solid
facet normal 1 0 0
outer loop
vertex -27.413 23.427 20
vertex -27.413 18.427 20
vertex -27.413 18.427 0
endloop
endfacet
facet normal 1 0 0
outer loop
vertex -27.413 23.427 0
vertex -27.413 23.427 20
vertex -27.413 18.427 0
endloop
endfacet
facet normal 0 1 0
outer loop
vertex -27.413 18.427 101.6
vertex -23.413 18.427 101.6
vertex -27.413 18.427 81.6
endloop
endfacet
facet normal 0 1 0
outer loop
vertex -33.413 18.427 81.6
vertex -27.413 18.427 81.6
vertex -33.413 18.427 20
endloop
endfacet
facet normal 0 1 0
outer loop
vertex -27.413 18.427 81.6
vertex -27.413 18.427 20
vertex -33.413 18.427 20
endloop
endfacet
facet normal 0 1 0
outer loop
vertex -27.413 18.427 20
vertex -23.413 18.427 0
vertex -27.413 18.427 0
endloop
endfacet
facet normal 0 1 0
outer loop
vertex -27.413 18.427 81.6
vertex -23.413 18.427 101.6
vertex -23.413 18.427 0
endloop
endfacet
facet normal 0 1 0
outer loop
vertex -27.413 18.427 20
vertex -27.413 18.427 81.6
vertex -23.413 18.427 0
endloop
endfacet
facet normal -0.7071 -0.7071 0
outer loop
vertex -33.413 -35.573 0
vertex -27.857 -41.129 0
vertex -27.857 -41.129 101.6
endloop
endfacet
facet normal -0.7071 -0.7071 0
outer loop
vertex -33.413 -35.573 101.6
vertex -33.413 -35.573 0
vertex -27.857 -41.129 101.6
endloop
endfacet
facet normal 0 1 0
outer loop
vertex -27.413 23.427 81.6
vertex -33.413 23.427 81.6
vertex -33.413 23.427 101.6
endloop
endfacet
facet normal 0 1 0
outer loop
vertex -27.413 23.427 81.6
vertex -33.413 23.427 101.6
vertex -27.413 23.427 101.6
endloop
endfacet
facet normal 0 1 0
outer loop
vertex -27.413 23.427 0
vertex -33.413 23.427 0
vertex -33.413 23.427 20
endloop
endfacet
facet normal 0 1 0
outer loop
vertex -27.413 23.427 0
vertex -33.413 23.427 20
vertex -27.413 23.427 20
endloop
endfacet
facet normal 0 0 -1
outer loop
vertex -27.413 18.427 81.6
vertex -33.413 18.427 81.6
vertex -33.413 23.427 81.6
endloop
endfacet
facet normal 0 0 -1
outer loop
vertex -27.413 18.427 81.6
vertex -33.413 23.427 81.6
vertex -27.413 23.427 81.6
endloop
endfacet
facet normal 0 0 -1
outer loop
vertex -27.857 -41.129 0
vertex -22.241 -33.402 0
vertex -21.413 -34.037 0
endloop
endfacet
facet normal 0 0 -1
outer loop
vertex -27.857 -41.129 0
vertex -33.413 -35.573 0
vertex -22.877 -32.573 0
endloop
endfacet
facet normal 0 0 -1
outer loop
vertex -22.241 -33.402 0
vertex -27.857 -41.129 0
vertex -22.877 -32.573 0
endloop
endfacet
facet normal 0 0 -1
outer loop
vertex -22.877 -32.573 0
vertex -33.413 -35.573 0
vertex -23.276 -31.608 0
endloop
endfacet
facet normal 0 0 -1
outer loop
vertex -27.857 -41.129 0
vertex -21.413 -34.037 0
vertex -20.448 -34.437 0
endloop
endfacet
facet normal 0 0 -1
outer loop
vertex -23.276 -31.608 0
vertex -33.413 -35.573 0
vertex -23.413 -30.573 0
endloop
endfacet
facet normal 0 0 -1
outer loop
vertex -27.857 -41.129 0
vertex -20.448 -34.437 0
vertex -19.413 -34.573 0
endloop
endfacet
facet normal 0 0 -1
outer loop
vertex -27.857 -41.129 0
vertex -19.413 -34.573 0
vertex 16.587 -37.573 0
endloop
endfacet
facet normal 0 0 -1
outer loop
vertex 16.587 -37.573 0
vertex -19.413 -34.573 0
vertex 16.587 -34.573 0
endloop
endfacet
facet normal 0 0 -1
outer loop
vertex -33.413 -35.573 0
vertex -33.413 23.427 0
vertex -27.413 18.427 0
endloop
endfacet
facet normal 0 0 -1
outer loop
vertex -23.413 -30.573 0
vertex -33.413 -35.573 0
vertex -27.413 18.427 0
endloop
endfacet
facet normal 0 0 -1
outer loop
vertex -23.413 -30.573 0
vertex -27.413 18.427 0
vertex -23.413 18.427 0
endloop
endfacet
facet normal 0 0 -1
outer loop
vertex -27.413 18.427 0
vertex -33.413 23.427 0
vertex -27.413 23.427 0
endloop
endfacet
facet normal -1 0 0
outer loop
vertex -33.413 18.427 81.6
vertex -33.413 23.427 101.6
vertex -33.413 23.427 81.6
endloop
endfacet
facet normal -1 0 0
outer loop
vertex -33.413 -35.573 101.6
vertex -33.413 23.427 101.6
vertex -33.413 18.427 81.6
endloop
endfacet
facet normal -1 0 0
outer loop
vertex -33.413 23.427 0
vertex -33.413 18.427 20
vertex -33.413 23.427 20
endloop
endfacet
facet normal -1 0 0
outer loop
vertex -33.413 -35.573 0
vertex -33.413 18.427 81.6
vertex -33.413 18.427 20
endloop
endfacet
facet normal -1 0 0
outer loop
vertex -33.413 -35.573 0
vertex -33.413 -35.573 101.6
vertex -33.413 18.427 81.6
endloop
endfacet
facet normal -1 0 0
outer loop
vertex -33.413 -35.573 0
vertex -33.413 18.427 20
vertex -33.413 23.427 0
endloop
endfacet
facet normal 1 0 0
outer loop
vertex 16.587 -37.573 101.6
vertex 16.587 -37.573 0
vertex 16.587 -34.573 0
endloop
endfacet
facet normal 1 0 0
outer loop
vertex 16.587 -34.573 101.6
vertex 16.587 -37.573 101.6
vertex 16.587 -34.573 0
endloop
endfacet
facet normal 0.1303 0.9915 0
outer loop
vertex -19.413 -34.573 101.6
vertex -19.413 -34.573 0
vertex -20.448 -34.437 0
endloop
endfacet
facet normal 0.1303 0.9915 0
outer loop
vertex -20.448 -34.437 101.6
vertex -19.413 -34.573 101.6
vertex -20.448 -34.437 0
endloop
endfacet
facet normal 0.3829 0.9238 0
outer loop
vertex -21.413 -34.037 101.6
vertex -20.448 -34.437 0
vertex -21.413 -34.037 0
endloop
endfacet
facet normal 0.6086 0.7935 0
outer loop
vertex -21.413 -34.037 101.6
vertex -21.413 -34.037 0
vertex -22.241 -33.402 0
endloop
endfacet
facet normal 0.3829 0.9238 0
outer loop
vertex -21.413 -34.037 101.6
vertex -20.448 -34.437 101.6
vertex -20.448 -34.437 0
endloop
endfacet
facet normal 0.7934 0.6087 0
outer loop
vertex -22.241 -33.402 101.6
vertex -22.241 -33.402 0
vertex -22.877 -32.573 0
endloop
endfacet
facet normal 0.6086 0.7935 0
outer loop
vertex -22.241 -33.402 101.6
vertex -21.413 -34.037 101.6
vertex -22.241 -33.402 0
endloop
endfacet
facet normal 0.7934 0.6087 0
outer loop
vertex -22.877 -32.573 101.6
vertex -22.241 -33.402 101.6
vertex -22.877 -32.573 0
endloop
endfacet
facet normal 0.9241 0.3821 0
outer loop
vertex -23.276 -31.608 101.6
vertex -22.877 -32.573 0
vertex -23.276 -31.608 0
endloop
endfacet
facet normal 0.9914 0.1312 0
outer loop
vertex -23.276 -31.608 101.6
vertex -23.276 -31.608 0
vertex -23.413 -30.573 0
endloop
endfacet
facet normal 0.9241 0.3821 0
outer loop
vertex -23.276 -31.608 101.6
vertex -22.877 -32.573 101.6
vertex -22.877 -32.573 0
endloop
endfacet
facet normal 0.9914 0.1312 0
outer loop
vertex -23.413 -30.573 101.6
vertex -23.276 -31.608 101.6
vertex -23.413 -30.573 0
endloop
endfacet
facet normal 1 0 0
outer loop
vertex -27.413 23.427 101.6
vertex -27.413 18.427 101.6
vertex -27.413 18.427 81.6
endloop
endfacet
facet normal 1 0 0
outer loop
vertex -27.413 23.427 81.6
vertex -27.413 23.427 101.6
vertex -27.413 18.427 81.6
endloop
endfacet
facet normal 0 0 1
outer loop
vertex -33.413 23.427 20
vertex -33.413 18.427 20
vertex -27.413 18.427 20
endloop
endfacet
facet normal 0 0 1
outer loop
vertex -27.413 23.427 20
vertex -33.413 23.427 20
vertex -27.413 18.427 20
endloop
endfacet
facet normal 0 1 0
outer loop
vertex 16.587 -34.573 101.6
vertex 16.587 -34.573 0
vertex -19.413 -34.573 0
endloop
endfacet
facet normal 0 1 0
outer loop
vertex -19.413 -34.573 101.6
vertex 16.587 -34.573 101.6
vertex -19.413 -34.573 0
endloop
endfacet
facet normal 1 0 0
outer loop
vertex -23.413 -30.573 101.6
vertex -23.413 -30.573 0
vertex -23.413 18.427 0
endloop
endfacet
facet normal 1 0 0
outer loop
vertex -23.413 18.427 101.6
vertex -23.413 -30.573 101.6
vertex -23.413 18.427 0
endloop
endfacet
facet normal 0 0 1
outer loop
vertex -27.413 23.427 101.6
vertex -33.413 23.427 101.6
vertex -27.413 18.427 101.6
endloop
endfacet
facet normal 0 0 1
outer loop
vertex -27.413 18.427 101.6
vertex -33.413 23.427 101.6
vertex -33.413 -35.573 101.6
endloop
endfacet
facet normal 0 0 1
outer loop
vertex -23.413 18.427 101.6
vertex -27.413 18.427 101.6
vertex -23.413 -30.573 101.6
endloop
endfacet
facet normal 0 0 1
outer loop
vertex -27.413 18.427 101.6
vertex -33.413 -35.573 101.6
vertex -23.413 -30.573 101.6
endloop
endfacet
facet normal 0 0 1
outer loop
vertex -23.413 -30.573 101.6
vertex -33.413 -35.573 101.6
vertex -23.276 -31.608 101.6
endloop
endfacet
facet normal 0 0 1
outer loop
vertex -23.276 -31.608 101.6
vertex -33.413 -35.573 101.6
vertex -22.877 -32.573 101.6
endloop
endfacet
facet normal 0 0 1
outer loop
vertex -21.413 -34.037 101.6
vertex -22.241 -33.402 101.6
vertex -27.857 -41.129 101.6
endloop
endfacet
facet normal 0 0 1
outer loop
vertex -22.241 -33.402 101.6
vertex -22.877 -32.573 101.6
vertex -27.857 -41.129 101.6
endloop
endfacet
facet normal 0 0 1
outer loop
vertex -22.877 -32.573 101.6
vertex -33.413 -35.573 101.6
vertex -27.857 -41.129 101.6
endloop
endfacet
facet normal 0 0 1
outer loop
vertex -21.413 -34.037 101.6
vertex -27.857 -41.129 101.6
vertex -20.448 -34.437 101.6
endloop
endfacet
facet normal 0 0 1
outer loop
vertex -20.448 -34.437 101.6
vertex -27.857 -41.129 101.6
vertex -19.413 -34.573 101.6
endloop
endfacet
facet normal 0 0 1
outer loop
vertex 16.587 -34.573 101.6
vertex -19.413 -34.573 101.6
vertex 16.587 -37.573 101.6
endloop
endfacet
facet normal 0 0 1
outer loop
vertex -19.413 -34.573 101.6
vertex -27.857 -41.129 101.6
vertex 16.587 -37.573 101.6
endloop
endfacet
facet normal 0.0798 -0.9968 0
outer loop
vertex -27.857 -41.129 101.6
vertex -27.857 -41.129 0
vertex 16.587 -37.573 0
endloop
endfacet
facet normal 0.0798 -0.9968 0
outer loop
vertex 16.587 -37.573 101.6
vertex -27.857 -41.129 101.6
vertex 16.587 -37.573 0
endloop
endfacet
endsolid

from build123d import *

# Parameters (mm, degrees)
BOSS_EXTRUDE1_DEPTH = 101.6
CHAMFER1_SIZE       = 6
CHAMFER1_SIZE2      = 5.57330498
FILLET1_R           = 4
SKETCH2_W           = 6
SKETCH2_H           = 20
BOSS_EXTRUDE2_DEPTH = 5


with BuildPart() as part:
    # Sketch1 → Boss-Extrude1 (new body)
    with BuildSketch(Plane.XY):
        Polygon((-33.412698413, -41.573204241), (16.587301587, -37.573204241), (16.587301587, -34.573204241), (-23.412698413, -34.573204241), (-23.412698413, 18.426795759), (-33.412698413, 18.426795759), (-33.412698413, -33.573204241), align=None)
    extrude(amount=BOSS_EXTRUDE1_DEPTH)

    # Chamfer1
    chamfer1_edges = [part.edges().sort_by_distance(p)[0] for p in [
        (-33.412698413, -41.573204241, 50.8),
    ]]
    chamfer1_side = [part.faces().sort_by_distance(p)[0] for p in [
        (-33.412698413, -11.573204241, 50.8),
    ]]
    chamfer(chamfer1_edges, length=CHAMFER1_SIZE, length2=CHAMFER1_SIZE2, reference=chamfer1_side[0])

    # Fillet1
    fillet1_edges = [part.edges().sort_by_distance(p)[0] for p in [
        (-23.412698413, -34.573204241, 50.8),
    ]]
    fillet(fillet1_edges, radius=FILLET1_R)

    # Sketch2 → Boss-Extrude2 (add)
    with BuildSketch(Plane(origin=(0, 18.426795759, 0), x_dir=(1, 0, 0), z_dir=(0, 1, 0))):
        with Locations((-30.412698413, -91.6)):
            Rectangle(SKETCH2_W, SKETCH2_H)
        with Locations((-30.412698413, -10)):
            Rectangle(SKETCH2_W, SKETCH2_H)
    extrude(amount=BOSS_EXTRUDE2_DEPTH)


solid = part.part
